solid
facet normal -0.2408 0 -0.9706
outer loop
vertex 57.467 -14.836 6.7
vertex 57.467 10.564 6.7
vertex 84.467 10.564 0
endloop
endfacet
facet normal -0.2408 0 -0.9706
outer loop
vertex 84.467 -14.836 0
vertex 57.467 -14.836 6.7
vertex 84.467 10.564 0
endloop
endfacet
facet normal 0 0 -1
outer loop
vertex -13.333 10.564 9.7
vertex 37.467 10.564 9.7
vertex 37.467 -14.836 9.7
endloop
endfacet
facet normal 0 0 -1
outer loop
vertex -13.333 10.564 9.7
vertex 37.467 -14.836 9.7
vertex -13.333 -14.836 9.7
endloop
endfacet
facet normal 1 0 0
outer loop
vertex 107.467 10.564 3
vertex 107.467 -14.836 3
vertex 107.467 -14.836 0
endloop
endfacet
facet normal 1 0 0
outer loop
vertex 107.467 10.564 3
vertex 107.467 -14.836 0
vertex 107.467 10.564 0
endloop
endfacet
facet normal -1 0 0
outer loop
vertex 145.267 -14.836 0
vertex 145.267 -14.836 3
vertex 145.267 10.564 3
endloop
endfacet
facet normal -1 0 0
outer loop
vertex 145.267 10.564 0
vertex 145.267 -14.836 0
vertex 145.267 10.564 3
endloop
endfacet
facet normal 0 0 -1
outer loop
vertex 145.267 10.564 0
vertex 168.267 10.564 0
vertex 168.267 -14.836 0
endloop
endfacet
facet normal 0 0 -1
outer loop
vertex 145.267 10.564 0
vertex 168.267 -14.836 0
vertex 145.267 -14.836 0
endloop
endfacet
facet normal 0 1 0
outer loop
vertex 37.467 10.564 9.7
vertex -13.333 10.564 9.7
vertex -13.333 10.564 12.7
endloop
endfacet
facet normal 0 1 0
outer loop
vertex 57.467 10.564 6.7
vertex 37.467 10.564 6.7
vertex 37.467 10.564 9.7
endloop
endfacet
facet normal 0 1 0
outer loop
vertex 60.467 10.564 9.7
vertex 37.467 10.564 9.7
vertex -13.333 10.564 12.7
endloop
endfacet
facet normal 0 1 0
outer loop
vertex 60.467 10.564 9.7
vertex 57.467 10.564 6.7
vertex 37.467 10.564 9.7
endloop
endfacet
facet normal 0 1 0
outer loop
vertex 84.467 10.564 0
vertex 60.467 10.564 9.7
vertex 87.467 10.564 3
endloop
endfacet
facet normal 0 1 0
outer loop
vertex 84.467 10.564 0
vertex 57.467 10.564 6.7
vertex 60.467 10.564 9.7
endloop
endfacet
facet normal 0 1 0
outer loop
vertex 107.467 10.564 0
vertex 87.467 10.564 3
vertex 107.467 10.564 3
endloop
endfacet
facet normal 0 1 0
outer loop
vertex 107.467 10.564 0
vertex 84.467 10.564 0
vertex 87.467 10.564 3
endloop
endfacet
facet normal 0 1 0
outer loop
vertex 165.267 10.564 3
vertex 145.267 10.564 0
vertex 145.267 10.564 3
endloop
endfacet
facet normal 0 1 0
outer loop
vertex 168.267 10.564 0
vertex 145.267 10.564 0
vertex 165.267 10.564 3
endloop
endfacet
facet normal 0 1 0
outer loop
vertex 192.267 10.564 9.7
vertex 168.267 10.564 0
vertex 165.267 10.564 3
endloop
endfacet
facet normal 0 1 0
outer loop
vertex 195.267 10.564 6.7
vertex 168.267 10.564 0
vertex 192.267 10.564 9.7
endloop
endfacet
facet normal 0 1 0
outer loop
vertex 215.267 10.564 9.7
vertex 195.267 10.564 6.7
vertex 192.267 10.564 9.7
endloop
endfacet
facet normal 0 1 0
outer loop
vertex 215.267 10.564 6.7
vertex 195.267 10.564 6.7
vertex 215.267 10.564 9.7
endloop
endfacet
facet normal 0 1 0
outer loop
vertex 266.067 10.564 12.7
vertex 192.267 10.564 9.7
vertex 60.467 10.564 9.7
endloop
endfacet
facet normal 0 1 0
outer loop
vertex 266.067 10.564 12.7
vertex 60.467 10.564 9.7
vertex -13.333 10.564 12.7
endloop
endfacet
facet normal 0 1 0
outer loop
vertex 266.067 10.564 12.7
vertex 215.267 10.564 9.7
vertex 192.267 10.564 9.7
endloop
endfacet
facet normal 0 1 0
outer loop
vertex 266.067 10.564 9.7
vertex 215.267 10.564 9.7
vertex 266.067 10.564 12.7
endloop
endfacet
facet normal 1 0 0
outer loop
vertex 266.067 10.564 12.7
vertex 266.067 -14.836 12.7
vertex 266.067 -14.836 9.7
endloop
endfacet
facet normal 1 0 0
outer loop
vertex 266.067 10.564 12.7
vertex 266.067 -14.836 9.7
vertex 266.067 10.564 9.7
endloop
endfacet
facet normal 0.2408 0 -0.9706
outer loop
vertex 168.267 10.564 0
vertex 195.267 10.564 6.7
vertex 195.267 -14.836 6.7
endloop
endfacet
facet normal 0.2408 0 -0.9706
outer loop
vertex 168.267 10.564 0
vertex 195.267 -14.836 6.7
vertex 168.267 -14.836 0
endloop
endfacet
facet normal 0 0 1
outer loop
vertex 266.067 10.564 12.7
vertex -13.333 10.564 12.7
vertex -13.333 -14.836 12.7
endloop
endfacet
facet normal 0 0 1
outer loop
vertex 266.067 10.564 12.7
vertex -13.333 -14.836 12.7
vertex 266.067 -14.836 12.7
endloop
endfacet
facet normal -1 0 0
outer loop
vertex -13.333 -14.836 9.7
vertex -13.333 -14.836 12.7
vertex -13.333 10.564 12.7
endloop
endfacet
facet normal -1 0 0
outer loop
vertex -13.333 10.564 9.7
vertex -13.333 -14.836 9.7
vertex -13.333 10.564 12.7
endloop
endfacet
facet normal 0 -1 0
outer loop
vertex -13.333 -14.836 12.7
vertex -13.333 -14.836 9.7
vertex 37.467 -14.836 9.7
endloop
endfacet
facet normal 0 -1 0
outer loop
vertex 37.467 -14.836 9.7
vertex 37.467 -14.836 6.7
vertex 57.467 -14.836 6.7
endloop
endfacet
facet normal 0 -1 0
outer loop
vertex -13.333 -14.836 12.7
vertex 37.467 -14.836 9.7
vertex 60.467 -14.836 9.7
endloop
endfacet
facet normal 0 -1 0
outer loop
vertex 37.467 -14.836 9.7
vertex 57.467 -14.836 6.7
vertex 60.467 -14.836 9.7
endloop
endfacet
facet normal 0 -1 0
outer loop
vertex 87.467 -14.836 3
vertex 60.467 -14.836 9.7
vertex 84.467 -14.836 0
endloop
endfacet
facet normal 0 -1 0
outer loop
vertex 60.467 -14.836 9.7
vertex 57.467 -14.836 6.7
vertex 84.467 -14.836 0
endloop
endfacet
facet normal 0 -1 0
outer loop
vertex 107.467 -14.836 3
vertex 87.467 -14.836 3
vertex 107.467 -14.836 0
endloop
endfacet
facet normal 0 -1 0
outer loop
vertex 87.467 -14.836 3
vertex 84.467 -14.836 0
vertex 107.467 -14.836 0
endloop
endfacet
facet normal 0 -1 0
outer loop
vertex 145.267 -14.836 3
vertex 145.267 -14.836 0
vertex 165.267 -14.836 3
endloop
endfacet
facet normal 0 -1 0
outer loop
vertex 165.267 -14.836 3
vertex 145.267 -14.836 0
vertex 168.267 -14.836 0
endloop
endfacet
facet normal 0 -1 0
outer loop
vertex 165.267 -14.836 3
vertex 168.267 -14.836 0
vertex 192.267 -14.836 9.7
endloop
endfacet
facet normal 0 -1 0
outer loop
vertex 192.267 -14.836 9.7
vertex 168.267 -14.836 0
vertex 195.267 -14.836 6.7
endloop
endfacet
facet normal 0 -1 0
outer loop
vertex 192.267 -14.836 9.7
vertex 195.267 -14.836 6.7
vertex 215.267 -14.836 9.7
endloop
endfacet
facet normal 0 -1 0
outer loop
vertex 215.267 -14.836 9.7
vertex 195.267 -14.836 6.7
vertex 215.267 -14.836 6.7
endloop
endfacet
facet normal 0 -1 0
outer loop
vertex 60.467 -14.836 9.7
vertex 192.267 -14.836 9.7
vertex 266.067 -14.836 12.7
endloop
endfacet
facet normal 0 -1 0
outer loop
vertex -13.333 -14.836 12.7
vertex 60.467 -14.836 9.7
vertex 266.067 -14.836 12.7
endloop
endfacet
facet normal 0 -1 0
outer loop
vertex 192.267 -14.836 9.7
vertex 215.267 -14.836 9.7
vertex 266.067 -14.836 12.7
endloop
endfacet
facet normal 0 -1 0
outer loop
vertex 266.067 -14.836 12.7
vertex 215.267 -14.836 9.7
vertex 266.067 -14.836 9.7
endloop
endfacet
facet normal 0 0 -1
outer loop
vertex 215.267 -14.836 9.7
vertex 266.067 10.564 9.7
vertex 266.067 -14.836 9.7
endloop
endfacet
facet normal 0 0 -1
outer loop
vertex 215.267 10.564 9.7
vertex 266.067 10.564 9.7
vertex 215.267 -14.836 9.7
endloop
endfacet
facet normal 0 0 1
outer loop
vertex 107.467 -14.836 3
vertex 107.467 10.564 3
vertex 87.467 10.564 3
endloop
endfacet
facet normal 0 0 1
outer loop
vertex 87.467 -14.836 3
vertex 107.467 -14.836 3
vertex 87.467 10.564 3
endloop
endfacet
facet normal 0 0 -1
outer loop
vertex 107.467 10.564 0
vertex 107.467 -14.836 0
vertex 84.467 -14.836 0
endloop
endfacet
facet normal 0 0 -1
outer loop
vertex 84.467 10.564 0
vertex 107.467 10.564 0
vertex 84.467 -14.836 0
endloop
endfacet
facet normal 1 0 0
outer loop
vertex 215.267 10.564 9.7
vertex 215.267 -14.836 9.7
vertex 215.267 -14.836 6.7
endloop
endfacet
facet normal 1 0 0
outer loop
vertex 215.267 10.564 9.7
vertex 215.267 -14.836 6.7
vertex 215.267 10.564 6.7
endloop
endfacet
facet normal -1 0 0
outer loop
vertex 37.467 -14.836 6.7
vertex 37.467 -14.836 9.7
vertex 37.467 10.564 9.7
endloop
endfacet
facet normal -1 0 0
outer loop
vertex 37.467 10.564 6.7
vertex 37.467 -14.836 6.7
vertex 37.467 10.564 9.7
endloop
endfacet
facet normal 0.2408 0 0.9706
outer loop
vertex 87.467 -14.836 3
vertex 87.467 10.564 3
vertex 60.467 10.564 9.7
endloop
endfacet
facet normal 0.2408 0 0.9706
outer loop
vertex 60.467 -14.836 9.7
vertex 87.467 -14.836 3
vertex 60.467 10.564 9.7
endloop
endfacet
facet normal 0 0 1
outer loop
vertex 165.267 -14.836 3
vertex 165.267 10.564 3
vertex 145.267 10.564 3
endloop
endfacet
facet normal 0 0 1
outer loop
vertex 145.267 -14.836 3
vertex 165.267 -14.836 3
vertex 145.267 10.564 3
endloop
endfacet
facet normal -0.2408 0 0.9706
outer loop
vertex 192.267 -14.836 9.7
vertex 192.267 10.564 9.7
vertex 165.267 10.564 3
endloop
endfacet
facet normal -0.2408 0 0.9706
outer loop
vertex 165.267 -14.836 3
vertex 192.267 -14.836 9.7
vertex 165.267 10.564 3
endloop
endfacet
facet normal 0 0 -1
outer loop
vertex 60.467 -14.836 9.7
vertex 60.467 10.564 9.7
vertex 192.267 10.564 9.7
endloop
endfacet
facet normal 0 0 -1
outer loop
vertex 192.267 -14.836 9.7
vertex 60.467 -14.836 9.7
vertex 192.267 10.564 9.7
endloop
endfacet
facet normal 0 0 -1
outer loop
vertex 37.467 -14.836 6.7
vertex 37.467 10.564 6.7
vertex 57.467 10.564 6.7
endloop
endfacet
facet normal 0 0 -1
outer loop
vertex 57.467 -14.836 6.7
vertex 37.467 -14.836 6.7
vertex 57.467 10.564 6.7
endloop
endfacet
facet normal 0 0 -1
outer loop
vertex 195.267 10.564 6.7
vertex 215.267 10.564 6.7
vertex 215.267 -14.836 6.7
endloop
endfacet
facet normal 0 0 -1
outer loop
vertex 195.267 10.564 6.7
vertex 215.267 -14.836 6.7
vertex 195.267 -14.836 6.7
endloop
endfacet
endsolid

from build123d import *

# Parameters (mm, degrees)
SKETCH1_W           = 304.8
SKETCH1_H           = 25.4
BOSS_EXTRUDE2_DEPTH = 12.7
FILLET1_R           = 12.7
CUT_EXTRUDE3_DEPTH  = 281.209703849
SKETCH8_W           = 70
SKETCH8_H           = 25.4
BOSS_EXTRUDE3_DEPTH = 9.7
CUT_EXTRUDE4_DEPTH  = 281.209703849
CUT_EXTRUDE5_DEPTH  = 281.209703849
SKETCH13_W          = 12.7
SKETCH13_H          = 25.4
CUT_EXTRUDE7_DEPTH  = 280.450243045


with BuildPart() as part:
    # Sketch1 → Boss-Extrude2 (new body)
    with BuildSketch(Plane.XY):
        with Locations((126.366978193, -2.136448598)):
            Rectangle(SKETCH1_W, SKETCH1_H)
    extrude(amount=BOSS_EXTRUDE2_DEPTH)

    # Fillet1
    fillet1_edges = [part.edges().sort_by_distance(p)[0] for p in [
        (-26.033021807, -2.136448598, 12.7),
        (278.766978193, -2.136448598, 12.7),
    ]]
    fillet(fillet1_edges, radius=FILLET1_R - 0.0001)  # a hair under: the kernel refuses the full size

    # Sketch6 → Cut-Extrude3 (cut, through all)
    with BuildSketch(Plane(origin=(0, 10.563551402, 0), x_dir=(1, 0, 0), z_dir=(0, 1, 0))):
        with BuildLine():
            Line((-23.033021807, 0), (275.766978193, 0))
            ThreePointArc((275.766978193, 0), (272.925913971, -6.858935778), (266.066978193, -9.7))
            Line((266.066978193, -9.7), (-13.333021807, -9.7))
            ThreePointArc((-13.333021807, -9.7), (-20.191957584, -6.858935778), (-23.033021807, 0))
        make_face()
    extrude(amount=-CUT_EXTRUDE3_DEPTH, mode=Mode.SUBTRACT)

    # Sketch8 → Boss-Extrude3 (add)
    with BuildSketch(Plane(origin=(0, 0, 9.7), x_dir=(-1, 0, 0), z_dir=(0, 0, -1))):
        with Locations((-180.266978193, -2.136448598)):
            Rectangle(SKETCH8_W, SKETCH8_H)
        with Locations((-72.466978193, -2.136448598)):
            Rectangle(SKETCH8_W, SKETCH8_H)
    extrude(amount=BOSS_EXTRUDE3_DEPTH)

    # Sketch9 → Cut-Extrude4 (cut, through all)
    with BuildSketch(Plane(origin=(0, 10.563551402, 0), x_dir=(1, 0, 0), z_dir=(0, 1, 0))):
        Polygon((145.266978193, -9.7), (165.266978193, -9.7), (192.266978193, -9.7), (165.266978193, -3), (145.266978193, -3), align=None)
        Polygon((215.266978193, -6.7), (195.266978193, -6.7), (168.266978193, 0), (215.266978193, 0), align=None)
    extrude(amount=-CUT_EXTRUDE4_DEPTH, mode=Mode.SUBTRACT)

    # Sketch12 → Cut-Extrude5 (cut, through all)
    with BuildSketch(Plane(origin=(0, 10.563551402, 0), x_dir=(1, 0, 0), z_dir=(0, 1, 0))):
        Polygon((107.466978193, -9.7), (107.466978193, -3), (87.466978193, -3), (60.466978193, -9.7), align=None)
        Polygon((37.466978193, -6.7), (57.466978193, -6.7), (84.466978193, 0), (37.466978193, 0), align=None)
    extrude(amount=-CUT_EXTRUDE5_DEPTH, mode=Mode.SUBTRACT)

    # Sketch13 → Cut-Extrude7 (cut, through all)
    with BuildSketch(Plane.XY.offset(12.7)):
        with Locations((-19.683021807, -2.136448598)):
            Rectangle(SKETCH13_W, SKETCH13_H)
        with Locations((272.416978193, -2.136448598)):
            Rectangle(SKETCH13_W, SKETCH13_H)
    extrude(amount=-CUT_EXTRUDE7_DEPTH, mode=Mode.SUBTRACT)


solid = part.part
